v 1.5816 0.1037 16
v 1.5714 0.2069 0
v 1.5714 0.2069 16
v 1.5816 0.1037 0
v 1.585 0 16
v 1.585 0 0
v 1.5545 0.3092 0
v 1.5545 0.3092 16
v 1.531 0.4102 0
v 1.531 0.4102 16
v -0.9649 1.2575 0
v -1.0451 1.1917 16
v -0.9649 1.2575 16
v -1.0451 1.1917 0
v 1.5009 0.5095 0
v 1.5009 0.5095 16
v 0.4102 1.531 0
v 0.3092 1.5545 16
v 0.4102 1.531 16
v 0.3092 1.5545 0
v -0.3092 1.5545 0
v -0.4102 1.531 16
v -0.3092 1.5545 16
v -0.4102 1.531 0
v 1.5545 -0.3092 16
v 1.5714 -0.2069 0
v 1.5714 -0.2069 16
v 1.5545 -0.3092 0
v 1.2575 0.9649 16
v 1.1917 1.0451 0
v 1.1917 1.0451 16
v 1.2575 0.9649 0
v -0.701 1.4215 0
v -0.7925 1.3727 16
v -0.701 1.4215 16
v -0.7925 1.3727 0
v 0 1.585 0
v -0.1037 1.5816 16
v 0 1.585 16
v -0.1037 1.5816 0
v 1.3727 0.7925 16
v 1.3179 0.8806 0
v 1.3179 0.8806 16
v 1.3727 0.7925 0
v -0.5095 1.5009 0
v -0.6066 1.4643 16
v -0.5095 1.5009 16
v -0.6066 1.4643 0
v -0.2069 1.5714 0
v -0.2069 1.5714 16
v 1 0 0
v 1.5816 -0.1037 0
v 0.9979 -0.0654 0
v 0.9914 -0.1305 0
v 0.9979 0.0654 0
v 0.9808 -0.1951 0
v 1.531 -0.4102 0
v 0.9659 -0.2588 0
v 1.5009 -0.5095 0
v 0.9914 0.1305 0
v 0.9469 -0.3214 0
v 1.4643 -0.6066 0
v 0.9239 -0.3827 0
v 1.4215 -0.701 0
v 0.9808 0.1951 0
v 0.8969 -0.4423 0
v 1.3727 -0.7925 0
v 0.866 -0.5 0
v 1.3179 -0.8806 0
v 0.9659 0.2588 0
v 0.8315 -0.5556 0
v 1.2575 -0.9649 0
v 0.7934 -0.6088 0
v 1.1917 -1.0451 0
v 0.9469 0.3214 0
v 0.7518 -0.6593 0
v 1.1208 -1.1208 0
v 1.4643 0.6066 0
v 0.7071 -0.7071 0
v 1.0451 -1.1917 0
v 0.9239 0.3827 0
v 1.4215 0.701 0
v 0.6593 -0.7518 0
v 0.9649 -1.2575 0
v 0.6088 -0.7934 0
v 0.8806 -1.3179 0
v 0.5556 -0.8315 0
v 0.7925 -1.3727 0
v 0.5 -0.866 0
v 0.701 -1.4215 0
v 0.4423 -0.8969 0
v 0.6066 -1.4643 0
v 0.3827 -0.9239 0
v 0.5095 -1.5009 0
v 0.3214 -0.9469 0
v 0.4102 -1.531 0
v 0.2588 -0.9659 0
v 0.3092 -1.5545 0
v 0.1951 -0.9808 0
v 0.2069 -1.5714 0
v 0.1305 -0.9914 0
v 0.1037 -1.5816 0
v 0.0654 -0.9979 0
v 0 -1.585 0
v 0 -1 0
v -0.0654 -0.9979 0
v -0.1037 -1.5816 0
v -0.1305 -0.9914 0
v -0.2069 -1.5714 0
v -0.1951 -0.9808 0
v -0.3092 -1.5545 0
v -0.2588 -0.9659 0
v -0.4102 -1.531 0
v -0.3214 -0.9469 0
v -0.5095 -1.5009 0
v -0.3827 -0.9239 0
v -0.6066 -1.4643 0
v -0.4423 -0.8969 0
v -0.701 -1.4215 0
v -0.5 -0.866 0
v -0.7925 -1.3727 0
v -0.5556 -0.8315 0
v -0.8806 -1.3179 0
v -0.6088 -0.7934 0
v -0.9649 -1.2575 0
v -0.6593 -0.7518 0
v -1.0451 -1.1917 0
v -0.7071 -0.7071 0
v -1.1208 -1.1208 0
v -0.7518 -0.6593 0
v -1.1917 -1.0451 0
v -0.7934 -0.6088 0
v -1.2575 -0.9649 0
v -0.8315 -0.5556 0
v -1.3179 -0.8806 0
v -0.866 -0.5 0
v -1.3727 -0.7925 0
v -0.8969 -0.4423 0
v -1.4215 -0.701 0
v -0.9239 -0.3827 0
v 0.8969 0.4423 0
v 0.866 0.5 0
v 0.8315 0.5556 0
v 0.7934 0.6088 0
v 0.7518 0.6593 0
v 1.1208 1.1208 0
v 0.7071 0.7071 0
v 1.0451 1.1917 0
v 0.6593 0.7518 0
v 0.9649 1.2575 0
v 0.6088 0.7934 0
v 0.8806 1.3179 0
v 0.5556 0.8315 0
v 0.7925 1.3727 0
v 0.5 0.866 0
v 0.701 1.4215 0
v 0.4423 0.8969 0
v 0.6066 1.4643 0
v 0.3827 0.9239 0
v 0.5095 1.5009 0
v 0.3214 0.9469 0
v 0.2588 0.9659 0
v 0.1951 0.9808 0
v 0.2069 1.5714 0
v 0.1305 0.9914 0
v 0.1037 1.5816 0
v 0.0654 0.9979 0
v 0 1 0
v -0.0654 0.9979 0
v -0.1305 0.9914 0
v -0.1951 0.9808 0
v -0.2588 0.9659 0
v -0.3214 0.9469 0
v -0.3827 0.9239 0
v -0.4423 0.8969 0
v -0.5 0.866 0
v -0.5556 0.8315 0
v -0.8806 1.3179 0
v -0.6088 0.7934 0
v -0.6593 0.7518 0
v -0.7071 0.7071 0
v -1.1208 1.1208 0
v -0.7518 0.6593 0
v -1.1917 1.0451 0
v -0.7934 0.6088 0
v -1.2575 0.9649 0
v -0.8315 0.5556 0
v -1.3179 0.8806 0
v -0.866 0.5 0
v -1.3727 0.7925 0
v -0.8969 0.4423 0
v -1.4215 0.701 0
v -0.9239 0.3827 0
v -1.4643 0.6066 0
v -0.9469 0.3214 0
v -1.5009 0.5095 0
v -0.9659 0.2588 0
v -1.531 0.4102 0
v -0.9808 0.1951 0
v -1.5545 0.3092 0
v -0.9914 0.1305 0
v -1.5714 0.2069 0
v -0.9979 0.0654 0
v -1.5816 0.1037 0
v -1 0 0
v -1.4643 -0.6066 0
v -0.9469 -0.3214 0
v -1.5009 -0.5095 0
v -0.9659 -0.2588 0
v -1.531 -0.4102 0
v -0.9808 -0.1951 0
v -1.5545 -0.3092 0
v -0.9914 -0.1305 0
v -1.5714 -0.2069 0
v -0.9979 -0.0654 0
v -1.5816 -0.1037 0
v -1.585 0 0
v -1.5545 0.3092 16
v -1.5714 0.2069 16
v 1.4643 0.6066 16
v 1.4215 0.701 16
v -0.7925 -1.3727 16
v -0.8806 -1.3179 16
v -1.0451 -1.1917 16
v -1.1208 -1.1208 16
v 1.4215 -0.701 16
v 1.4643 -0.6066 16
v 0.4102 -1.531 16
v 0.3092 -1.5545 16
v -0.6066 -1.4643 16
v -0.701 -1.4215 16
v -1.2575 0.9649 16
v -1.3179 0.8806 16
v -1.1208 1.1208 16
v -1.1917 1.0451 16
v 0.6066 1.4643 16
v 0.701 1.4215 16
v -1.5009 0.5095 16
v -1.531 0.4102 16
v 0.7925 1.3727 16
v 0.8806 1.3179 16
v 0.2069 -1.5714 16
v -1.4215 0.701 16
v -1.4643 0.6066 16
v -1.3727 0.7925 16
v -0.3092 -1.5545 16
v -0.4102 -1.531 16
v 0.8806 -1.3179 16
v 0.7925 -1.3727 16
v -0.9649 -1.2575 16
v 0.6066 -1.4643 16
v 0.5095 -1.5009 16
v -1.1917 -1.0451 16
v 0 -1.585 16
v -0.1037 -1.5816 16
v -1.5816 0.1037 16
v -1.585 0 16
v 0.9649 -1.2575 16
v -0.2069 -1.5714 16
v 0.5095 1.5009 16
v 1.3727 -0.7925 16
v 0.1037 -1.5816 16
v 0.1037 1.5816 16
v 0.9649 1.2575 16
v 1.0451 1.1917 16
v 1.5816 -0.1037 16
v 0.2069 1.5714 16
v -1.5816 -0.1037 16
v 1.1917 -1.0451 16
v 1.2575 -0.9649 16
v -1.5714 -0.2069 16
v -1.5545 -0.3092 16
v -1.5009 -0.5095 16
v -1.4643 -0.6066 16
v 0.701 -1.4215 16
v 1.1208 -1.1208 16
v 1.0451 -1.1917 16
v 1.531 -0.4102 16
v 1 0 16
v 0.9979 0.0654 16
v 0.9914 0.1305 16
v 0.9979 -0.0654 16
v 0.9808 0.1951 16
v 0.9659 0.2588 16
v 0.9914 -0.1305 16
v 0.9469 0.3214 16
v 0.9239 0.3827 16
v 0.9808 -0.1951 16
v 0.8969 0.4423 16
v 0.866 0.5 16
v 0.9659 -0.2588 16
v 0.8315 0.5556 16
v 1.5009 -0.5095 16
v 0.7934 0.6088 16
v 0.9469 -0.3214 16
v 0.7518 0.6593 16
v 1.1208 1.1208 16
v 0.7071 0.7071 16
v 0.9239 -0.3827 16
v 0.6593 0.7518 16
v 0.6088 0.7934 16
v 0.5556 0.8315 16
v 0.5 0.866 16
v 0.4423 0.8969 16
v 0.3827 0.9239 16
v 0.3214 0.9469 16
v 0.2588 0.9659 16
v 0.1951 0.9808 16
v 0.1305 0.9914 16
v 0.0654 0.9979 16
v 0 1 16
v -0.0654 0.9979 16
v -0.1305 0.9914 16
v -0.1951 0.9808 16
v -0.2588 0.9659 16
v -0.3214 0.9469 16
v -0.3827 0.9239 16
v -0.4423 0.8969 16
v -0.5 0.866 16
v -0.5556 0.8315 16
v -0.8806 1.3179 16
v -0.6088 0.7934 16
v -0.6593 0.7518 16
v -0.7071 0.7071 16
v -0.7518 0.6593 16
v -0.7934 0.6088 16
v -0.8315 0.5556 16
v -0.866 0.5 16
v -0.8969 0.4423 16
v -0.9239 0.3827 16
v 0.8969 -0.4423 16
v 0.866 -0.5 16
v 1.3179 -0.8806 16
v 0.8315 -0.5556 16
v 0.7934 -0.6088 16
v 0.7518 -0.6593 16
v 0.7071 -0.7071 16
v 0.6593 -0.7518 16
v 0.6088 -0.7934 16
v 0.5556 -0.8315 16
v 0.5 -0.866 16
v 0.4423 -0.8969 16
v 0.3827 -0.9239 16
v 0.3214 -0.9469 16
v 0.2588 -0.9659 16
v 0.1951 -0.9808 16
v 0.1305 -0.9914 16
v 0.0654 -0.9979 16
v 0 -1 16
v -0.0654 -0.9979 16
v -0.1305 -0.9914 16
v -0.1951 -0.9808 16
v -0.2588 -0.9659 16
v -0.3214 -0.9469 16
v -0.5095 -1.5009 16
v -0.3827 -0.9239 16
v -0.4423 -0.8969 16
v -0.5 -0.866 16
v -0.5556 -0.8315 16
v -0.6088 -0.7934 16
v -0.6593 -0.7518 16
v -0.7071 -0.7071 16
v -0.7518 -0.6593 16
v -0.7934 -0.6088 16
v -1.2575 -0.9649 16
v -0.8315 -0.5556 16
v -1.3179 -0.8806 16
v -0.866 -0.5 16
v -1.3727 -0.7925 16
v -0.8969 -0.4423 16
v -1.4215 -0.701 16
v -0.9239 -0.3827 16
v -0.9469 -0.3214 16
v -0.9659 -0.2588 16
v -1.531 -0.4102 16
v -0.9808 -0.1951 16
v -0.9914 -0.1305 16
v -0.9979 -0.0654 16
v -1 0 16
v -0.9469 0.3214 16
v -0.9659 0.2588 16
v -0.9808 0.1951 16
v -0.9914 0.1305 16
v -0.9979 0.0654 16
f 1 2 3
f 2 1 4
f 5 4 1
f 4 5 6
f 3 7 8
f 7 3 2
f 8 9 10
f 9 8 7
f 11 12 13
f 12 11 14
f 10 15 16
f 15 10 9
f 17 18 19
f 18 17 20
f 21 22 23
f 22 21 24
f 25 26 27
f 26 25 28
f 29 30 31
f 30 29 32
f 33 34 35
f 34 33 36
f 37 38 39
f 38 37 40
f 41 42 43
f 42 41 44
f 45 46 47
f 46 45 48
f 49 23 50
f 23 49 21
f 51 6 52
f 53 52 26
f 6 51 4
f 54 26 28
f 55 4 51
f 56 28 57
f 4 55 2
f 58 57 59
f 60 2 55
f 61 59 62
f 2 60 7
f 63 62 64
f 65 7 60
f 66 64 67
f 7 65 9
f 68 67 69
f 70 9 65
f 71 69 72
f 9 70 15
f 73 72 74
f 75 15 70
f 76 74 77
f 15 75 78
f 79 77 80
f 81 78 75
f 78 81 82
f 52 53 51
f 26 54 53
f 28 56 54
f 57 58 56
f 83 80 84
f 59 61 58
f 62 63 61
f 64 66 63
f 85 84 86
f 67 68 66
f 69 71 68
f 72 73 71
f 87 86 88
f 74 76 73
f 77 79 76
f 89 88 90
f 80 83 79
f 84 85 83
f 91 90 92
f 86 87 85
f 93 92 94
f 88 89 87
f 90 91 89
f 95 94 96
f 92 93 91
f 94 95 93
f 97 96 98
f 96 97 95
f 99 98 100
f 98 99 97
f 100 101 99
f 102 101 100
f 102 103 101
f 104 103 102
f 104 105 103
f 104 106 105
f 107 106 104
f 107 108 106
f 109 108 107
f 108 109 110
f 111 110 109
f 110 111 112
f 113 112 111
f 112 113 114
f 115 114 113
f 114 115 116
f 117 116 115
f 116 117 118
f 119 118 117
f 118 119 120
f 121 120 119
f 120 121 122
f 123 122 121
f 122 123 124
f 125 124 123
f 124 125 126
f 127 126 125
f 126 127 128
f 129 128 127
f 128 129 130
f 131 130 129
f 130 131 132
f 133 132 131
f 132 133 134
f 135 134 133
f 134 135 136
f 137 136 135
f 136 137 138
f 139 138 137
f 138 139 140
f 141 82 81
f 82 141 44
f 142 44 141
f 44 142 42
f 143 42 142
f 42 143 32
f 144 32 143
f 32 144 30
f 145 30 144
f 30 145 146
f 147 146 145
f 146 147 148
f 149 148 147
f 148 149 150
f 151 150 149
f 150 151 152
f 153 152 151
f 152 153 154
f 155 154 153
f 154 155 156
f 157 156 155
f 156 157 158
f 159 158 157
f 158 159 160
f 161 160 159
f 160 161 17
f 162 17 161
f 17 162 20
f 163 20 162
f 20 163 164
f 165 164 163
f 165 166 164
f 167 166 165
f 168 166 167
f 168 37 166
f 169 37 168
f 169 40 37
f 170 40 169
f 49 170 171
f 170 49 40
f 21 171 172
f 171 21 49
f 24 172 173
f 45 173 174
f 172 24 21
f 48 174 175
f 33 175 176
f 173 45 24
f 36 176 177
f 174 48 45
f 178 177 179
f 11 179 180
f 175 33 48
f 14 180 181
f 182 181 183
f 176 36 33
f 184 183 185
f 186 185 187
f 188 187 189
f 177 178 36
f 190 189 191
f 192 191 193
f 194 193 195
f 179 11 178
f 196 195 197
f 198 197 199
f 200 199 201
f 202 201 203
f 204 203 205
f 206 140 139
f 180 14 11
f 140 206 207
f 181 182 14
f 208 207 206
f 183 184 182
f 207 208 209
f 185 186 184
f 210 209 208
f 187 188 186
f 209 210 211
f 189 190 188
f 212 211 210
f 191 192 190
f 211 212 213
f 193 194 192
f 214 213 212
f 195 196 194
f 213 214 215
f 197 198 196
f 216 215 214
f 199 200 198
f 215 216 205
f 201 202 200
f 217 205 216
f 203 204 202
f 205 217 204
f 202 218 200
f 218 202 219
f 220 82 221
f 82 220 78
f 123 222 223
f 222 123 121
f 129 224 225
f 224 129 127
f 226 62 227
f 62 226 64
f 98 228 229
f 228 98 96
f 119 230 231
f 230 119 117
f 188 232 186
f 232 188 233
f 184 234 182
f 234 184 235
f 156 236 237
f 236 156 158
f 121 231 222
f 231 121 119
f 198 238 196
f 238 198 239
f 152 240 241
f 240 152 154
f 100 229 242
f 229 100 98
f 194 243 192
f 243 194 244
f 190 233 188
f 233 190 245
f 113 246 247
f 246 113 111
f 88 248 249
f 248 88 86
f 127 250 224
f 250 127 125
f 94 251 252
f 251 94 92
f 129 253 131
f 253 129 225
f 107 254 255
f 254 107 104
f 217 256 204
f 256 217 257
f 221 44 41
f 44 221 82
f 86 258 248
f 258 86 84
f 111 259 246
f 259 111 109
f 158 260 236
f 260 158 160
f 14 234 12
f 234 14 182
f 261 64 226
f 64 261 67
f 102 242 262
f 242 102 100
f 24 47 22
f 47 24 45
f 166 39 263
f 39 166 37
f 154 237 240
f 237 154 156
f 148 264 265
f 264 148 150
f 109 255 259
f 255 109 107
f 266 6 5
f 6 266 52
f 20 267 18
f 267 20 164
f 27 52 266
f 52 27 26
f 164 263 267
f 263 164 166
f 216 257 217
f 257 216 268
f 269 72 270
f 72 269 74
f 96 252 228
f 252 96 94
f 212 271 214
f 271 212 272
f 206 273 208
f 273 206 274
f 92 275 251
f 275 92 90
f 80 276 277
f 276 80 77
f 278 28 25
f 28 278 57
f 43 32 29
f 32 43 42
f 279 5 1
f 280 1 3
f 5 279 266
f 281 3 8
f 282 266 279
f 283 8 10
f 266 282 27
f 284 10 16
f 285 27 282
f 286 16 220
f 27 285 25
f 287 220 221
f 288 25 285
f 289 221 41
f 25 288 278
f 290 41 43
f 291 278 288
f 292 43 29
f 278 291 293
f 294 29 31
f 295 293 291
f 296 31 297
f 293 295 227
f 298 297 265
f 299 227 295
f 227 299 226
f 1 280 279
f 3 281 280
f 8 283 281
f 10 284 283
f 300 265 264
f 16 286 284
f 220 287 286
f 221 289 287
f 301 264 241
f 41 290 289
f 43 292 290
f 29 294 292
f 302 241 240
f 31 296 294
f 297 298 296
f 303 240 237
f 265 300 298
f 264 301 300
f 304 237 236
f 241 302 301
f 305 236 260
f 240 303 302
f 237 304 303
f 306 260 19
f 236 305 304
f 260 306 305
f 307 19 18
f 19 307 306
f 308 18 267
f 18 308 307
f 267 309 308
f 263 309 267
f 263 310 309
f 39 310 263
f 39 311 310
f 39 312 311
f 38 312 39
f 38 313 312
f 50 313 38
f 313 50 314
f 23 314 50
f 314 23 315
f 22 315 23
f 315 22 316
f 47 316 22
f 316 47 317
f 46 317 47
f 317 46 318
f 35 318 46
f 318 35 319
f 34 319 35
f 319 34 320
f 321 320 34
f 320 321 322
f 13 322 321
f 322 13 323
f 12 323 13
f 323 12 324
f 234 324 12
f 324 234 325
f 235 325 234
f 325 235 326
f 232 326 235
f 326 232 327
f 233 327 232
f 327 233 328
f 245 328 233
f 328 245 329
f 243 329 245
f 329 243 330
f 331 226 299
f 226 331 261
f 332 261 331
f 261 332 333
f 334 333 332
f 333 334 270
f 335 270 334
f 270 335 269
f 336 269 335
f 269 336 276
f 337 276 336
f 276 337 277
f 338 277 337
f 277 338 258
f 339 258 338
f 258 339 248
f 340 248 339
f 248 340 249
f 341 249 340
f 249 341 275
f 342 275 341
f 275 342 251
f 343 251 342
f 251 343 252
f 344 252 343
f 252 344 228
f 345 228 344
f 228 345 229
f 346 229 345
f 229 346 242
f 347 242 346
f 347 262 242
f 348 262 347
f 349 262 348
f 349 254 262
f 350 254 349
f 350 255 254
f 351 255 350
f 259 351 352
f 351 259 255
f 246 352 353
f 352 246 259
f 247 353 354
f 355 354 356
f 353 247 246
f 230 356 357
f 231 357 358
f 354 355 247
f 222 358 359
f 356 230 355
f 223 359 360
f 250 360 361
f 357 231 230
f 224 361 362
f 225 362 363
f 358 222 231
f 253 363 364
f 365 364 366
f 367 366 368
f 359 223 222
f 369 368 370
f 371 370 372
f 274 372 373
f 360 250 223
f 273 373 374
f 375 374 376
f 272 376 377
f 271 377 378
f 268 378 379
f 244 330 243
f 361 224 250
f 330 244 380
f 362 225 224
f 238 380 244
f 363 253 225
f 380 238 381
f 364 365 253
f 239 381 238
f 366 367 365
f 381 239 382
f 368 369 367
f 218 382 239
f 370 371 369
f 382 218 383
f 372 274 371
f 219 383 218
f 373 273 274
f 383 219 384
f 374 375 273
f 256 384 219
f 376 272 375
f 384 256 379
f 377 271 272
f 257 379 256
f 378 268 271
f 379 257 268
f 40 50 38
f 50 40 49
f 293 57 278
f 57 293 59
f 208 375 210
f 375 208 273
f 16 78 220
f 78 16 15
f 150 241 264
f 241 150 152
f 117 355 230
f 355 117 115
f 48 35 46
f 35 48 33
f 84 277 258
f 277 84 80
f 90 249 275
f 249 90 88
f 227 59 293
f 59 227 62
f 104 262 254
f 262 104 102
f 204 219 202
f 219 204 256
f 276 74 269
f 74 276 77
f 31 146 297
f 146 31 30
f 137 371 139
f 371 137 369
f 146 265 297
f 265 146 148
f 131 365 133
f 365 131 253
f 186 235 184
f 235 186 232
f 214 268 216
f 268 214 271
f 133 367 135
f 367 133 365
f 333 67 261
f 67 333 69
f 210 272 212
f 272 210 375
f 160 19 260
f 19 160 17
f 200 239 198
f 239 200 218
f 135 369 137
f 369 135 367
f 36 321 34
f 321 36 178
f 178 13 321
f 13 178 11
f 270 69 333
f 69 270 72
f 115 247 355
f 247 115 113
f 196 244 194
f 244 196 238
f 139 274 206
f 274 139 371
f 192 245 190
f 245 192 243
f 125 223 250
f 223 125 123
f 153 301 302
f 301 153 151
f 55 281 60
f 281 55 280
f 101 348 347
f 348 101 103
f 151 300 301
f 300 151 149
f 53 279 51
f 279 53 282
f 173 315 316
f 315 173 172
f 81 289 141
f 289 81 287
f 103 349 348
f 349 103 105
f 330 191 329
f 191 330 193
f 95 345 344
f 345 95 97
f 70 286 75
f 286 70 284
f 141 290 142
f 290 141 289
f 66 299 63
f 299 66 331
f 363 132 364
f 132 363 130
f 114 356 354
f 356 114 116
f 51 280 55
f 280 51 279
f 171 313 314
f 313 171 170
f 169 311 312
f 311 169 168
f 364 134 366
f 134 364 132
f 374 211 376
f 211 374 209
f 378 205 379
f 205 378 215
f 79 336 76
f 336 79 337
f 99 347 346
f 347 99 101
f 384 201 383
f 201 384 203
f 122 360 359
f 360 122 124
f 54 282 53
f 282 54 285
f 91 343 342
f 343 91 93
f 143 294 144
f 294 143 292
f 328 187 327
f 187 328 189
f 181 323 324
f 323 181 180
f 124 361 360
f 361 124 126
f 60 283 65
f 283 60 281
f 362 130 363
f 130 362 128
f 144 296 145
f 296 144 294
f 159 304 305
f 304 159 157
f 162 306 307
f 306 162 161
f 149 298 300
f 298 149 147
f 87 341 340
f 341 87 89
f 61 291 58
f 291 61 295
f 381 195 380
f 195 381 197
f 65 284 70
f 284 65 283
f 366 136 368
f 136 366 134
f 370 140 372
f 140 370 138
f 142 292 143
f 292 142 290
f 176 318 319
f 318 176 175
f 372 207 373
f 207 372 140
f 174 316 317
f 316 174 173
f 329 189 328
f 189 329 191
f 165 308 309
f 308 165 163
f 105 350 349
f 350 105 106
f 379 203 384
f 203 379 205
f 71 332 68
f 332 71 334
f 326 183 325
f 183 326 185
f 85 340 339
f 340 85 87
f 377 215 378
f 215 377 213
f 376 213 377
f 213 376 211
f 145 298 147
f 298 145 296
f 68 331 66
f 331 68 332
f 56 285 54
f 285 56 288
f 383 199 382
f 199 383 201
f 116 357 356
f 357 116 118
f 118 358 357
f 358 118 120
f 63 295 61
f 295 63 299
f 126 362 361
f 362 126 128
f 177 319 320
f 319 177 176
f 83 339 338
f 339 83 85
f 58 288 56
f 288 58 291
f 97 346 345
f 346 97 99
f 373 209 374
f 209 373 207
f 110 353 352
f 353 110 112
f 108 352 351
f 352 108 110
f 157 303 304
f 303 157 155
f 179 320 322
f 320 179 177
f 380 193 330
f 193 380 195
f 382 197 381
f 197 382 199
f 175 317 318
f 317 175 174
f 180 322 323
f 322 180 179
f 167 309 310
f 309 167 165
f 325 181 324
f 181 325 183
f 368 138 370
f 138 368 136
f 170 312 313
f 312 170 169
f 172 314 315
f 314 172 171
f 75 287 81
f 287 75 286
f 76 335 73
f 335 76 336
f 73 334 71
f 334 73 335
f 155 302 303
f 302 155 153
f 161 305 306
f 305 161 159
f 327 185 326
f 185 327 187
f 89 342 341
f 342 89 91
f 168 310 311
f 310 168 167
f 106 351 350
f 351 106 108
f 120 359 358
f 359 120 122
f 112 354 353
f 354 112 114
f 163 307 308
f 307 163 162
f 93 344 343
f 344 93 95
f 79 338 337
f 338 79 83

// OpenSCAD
$fn = 96;

thread_d = 2.0;      // mm (nominal)
length   = 16.0;     // mm
outer_d  = 3.17;     // mm

difference() {
  cylinder(h = length, d = outer_d);
  cylinder(h = length + 0.2, d = thread_d);
}
